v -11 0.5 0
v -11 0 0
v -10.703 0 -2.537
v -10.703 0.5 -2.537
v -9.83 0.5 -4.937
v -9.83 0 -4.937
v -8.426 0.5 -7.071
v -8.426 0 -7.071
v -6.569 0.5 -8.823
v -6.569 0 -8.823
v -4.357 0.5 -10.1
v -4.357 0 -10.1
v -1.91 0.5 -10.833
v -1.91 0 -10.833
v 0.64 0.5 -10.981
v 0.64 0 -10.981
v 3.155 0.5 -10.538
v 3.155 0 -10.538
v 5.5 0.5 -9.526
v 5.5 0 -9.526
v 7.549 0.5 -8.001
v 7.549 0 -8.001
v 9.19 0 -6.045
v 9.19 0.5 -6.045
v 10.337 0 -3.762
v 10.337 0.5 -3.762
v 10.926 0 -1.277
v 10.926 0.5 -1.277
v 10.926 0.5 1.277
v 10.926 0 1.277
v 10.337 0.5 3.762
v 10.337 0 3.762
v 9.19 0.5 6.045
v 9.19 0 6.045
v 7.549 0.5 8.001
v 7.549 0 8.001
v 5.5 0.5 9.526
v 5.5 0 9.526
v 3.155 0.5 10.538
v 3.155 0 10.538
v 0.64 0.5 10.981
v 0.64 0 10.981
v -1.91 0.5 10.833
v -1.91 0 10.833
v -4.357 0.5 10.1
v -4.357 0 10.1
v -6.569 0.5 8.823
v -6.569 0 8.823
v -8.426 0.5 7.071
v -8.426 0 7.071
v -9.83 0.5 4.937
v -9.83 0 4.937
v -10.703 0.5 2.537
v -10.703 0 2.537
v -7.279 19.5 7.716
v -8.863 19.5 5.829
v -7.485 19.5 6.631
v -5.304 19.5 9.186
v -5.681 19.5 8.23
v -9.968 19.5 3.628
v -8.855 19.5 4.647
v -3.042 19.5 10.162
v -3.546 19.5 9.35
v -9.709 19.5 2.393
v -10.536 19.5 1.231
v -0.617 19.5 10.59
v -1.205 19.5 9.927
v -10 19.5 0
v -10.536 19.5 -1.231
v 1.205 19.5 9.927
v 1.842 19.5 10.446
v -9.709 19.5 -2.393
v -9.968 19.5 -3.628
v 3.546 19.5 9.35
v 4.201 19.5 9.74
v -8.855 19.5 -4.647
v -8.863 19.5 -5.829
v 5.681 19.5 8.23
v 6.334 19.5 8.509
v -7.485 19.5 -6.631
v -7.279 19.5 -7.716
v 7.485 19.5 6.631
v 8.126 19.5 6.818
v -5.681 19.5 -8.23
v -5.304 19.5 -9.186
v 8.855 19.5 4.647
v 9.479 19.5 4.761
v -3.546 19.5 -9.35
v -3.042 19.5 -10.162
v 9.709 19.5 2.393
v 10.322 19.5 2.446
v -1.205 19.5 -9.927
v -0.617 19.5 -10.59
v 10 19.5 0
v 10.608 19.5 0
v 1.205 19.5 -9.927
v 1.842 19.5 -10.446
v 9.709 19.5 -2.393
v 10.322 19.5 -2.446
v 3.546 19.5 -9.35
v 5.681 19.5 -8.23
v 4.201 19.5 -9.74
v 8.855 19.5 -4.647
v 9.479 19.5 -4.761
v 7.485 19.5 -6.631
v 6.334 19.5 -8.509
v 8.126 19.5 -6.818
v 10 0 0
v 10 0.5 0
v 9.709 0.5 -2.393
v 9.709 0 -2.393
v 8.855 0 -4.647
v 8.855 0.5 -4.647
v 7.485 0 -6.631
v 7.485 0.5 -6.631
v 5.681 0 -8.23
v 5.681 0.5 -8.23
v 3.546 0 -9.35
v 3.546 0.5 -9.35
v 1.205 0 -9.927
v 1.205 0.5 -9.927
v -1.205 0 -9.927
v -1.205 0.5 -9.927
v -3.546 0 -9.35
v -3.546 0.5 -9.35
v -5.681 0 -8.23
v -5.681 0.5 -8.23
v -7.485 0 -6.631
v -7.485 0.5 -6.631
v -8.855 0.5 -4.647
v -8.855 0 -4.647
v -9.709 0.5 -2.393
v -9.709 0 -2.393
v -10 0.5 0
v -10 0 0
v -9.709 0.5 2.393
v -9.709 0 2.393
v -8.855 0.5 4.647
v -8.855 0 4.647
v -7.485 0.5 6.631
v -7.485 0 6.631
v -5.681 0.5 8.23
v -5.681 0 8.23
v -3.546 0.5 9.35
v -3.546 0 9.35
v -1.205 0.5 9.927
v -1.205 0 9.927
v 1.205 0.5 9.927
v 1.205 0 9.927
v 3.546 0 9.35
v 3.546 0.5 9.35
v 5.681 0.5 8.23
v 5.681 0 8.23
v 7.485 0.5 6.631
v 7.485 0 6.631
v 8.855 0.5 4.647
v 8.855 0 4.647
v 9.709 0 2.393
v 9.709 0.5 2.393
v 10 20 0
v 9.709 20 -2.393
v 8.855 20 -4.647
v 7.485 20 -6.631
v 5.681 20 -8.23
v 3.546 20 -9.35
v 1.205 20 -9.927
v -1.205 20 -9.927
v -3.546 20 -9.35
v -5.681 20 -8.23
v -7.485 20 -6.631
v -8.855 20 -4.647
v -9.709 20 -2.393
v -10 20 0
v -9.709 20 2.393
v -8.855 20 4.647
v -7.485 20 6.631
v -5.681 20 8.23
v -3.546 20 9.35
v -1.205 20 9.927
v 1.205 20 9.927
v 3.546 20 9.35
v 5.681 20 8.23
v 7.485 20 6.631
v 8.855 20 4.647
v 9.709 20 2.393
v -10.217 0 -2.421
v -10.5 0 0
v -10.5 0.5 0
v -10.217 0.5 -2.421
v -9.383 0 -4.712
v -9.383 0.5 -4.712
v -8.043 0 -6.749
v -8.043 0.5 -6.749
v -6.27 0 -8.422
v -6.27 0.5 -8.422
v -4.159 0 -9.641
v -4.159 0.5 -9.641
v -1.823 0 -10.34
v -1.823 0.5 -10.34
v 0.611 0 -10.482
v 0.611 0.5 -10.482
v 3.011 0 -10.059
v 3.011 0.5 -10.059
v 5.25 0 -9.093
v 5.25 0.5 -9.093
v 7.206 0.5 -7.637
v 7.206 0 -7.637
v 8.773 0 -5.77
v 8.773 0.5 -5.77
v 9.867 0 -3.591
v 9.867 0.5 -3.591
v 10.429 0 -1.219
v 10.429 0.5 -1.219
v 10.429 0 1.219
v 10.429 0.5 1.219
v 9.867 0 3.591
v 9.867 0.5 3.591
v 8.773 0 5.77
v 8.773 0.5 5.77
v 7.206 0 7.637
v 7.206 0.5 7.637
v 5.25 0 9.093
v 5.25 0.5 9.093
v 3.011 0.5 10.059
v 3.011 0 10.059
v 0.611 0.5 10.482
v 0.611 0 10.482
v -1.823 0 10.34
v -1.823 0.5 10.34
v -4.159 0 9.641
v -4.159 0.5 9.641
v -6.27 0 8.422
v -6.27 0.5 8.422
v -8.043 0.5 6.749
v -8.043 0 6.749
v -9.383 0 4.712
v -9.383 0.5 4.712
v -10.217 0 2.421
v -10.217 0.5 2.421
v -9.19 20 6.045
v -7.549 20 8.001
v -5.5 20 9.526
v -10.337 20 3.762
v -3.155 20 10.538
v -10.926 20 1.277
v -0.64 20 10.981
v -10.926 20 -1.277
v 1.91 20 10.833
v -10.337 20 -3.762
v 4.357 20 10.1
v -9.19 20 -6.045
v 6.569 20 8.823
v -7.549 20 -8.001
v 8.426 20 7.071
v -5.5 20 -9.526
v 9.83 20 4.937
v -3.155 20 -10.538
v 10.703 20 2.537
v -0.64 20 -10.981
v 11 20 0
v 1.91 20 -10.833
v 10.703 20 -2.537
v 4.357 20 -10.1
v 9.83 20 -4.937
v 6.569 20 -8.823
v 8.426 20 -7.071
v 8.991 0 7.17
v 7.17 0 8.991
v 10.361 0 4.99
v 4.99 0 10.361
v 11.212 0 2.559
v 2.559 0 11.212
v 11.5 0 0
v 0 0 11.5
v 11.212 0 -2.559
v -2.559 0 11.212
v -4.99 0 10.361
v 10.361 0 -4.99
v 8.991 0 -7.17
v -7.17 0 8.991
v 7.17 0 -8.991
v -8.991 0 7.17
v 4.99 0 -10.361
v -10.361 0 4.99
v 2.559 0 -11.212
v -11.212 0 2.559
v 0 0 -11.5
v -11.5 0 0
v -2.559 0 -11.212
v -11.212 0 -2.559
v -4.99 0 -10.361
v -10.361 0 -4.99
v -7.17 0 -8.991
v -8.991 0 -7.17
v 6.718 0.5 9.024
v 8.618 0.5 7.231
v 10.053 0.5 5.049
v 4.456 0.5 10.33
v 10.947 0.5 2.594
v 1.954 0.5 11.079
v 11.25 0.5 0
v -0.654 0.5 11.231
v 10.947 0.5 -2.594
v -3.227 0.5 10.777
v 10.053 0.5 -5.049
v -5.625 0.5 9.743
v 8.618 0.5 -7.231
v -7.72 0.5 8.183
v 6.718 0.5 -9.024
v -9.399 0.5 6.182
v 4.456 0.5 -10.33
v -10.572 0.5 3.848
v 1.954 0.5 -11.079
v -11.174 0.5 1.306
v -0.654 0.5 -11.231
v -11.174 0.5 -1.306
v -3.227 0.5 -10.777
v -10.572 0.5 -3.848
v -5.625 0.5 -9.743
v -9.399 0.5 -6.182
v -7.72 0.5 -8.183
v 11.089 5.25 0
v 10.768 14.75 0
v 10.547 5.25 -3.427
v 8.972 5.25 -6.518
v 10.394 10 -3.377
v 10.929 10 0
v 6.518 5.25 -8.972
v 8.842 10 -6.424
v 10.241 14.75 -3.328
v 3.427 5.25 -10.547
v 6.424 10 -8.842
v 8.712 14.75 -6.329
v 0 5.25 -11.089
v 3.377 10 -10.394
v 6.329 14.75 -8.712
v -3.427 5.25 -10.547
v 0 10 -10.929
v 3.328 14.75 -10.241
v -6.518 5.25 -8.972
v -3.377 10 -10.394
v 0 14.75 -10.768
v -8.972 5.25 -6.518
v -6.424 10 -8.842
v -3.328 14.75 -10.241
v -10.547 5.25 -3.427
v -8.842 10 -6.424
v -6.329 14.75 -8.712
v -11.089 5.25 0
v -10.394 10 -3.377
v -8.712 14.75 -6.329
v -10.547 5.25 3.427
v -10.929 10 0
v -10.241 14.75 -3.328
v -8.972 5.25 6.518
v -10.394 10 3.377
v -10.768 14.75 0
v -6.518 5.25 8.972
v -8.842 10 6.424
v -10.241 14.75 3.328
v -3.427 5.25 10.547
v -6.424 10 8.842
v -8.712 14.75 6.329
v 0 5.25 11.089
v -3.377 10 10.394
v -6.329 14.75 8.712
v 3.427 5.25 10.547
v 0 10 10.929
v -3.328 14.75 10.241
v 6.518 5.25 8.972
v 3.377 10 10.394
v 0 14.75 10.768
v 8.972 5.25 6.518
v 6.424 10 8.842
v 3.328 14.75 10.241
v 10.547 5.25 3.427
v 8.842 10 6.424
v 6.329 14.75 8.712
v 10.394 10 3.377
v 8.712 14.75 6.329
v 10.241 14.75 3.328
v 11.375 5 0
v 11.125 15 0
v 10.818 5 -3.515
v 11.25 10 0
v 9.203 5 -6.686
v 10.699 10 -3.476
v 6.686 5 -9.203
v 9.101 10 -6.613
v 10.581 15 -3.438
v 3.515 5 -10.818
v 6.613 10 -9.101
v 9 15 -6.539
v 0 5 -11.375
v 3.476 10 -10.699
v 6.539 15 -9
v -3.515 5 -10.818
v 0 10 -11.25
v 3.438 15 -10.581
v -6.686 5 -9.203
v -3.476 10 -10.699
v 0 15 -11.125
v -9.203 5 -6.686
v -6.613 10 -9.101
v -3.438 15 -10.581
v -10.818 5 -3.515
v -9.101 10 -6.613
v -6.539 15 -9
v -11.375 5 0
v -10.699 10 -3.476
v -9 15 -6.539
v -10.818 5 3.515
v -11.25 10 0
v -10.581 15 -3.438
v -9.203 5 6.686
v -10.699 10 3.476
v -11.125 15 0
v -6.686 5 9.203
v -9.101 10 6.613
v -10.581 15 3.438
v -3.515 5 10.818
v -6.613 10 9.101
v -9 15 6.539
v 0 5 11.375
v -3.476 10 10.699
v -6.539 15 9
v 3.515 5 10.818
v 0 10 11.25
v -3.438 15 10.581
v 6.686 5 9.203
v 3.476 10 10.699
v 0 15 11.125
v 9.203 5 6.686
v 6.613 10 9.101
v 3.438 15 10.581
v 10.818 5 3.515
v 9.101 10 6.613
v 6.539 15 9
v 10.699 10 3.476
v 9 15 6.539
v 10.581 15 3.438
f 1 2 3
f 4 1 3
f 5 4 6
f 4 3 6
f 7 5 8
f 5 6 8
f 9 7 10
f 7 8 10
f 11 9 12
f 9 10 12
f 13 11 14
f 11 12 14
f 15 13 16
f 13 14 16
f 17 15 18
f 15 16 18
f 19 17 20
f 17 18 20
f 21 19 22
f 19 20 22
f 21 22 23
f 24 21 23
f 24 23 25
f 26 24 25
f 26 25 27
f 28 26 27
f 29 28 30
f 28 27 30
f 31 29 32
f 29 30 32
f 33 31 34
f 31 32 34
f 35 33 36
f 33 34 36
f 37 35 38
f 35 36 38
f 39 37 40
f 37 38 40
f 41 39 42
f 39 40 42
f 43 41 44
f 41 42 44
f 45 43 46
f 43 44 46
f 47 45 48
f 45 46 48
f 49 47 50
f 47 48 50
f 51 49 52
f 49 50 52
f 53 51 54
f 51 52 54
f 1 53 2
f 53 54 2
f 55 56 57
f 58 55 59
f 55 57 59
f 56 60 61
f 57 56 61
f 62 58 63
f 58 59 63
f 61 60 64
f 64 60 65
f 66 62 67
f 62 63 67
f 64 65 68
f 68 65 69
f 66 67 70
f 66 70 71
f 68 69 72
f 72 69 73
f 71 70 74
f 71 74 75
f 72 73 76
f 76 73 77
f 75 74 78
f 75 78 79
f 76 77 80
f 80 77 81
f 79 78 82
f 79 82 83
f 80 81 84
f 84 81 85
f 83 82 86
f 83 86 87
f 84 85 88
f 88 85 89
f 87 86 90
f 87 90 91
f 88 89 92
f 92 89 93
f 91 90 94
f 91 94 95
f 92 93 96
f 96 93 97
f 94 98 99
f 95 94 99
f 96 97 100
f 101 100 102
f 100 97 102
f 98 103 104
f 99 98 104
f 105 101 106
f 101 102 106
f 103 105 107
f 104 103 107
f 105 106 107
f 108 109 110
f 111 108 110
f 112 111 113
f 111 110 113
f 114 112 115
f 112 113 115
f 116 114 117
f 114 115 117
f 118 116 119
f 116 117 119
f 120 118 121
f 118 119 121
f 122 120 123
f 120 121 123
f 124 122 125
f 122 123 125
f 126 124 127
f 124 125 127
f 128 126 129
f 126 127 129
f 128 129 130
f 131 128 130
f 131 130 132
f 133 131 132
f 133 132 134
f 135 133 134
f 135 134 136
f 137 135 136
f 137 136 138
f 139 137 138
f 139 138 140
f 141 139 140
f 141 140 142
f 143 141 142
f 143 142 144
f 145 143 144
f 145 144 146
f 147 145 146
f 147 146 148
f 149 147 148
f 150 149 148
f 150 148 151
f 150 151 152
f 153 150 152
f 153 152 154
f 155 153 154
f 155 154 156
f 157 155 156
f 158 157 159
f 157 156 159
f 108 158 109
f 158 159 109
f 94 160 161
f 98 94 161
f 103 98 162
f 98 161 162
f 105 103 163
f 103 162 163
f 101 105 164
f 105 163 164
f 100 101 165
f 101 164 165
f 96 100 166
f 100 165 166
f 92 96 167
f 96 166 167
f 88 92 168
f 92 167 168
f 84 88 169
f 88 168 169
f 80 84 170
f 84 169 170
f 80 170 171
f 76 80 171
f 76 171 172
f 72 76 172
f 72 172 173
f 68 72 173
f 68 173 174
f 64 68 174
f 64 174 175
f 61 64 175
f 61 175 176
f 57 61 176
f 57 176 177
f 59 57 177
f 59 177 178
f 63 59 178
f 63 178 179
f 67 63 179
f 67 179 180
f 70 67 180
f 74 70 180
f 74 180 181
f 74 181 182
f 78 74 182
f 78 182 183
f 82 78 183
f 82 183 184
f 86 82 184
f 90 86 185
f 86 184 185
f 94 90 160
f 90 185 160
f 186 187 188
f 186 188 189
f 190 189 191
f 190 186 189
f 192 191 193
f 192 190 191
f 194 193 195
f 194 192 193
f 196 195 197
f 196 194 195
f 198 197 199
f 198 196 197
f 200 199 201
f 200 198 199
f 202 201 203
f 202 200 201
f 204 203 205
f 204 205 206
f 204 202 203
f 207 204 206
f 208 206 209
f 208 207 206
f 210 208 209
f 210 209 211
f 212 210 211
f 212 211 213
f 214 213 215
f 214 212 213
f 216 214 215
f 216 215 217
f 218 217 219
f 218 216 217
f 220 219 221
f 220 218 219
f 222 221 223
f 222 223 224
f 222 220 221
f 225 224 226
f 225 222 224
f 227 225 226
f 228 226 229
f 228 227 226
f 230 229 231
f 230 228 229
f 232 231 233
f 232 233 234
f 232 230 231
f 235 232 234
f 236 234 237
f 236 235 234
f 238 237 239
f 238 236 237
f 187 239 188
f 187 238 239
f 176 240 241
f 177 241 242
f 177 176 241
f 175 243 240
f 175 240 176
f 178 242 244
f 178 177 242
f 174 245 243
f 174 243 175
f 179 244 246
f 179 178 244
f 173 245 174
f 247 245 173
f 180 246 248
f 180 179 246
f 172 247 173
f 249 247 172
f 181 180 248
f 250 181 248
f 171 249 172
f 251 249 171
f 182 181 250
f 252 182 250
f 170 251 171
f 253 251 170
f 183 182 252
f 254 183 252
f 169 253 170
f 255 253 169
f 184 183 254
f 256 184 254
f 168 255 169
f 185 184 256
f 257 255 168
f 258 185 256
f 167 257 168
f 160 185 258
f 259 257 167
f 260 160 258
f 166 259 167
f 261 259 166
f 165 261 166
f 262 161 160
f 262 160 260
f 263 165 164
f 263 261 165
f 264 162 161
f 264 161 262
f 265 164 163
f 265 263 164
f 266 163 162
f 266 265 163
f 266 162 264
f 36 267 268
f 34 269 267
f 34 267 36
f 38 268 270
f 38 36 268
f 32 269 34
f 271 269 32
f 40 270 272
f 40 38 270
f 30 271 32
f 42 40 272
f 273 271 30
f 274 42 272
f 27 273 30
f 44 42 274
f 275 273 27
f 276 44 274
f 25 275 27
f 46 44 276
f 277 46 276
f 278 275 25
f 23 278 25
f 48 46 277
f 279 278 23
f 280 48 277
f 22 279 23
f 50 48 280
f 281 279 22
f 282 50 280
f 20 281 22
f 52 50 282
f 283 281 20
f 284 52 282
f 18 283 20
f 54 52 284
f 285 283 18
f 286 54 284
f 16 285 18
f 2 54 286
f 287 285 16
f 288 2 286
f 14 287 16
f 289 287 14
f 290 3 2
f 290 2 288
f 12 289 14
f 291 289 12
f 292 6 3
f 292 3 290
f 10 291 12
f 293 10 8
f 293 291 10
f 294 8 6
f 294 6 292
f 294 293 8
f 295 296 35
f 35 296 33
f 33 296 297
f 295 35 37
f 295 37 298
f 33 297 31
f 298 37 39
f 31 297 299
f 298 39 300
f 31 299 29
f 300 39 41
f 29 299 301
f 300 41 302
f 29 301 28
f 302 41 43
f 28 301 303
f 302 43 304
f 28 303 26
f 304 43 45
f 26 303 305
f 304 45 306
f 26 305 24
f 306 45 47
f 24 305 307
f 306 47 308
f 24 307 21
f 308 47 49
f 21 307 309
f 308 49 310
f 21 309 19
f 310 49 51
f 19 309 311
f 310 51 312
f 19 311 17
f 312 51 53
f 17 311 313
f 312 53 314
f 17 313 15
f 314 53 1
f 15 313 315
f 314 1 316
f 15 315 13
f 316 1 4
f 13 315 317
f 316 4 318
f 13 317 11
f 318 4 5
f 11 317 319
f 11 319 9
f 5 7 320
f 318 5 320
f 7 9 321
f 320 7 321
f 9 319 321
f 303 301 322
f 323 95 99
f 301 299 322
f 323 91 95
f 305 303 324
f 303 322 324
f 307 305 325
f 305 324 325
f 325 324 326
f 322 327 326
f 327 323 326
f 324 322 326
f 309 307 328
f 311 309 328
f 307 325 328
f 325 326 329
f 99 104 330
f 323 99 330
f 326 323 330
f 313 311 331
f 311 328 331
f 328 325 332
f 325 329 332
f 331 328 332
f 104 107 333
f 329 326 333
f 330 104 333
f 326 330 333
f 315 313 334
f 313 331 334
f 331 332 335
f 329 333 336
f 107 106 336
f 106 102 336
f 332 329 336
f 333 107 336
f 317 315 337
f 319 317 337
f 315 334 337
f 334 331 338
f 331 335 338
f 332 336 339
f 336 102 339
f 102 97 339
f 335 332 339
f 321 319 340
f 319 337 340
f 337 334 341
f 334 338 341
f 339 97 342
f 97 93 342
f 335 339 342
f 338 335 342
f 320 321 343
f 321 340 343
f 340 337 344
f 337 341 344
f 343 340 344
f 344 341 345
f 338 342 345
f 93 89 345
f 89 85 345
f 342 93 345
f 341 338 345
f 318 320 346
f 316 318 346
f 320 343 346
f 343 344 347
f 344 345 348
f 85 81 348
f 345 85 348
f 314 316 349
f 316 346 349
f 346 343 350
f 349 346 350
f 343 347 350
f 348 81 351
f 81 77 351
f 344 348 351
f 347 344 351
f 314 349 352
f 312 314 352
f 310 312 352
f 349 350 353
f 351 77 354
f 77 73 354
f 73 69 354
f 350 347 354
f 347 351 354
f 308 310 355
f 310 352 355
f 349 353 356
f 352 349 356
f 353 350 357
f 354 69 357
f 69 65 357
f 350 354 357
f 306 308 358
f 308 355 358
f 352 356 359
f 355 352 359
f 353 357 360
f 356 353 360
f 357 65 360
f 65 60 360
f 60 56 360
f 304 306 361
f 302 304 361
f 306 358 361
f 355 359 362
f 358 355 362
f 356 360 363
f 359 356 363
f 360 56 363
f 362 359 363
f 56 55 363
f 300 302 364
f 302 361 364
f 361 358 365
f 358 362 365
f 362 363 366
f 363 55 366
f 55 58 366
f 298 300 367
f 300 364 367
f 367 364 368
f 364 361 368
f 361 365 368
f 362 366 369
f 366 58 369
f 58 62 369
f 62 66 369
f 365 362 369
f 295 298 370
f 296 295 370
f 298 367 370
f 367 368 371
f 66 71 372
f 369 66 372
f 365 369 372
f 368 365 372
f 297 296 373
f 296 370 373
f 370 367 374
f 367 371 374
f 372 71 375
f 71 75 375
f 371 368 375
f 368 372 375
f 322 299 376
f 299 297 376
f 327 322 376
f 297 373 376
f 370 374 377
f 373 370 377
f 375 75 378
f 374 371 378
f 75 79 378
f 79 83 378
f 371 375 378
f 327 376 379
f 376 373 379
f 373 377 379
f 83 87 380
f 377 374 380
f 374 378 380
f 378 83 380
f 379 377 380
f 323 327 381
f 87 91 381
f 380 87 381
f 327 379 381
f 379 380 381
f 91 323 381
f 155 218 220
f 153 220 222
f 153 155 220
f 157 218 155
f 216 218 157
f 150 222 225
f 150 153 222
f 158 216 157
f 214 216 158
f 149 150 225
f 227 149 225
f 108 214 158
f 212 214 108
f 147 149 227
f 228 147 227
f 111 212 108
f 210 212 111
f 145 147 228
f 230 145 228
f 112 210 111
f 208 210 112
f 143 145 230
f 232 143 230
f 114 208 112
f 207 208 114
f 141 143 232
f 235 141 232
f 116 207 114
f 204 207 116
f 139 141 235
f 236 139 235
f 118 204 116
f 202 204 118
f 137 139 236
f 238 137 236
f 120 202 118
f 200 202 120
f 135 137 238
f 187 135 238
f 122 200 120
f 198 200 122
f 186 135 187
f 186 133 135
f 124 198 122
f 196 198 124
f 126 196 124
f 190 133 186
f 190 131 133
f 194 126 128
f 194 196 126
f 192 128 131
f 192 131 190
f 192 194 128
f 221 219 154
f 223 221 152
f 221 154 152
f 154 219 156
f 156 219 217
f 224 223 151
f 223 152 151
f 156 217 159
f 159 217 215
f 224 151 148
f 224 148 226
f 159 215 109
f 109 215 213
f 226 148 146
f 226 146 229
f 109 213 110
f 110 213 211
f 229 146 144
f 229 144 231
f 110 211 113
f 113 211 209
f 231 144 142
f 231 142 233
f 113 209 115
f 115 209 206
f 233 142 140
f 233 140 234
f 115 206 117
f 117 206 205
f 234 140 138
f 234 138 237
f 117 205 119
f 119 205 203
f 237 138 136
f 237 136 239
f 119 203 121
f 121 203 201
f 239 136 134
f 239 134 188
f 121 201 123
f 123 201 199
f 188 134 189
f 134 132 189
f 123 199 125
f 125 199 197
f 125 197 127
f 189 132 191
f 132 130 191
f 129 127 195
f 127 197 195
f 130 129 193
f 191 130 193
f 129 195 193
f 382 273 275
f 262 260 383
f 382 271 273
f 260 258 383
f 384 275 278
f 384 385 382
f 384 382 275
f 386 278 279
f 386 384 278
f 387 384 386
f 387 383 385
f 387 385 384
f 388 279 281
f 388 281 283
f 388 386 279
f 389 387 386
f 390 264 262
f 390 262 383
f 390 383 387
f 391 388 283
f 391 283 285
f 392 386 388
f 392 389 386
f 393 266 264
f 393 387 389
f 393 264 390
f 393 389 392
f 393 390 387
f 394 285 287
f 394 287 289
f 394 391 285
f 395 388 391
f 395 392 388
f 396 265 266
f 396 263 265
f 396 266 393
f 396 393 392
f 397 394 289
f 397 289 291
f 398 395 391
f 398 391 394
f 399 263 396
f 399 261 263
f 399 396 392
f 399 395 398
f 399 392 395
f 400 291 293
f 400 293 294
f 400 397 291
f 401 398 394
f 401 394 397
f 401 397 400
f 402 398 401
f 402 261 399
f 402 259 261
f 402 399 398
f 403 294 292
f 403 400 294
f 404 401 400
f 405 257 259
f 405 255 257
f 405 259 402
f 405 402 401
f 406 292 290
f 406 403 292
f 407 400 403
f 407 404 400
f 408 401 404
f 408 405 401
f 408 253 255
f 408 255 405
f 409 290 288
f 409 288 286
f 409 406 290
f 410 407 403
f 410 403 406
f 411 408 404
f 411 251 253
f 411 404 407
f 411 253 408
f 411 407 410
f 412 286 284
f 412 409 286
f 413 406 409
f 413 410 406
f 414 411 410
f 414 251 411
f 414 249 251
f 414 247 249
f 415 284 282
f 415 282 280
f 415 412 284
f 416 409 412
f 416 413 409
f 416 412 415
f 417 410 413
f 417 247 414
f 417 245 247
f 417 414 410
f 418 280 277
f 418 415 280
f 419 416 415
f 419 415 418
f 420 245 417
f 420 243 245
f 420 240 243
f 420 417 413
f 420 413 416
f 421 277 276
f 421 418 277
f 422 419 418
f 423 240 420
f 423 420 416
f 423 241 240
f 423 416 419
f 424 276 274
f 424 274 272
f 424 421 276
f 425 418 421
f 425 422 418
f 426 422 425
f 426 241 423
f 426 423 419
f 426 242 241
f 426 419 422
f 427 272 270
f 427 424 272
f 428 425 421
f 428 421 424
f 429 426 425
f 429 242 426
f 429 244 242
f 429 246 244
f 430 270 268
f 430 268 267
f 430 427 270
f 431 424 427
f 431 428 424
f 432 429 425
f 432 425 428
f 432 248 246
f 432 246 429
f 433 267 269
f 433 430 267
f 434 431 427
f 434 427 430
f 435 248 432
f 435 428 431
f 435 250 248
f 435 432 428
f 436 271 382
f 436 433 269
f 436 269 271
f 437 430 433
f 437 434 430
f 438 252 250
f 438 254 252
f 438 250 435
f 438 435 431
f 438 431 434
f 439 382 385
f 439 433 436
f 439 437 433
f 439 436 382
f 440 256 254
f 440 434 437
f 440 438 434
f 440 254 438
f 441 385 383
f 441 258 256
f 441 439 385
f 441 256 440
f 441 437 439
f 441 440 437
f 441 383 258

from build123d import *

# Parameters (mm, degrees)
SKETCH6_R          = 10
CUT_EXTRUDE1_DEPTH = 20
SKETCH8_R          = 11
SKETCH8_R_2        = 10.5
CUT_EXTRUDE3_DEPTH = 0.5


with BuildPart() as part:
    # Sketch3 → Revolve1 (revolve)
    with BuildSketch(Plane.XY):
        Polygon((0, 0), (11.5, 0), (11, 20), (0, 20), align=None)
    revolve(axis=Axis((0, 0, 0), (0, 1, 0)))

    # Sketch6 → Cut-Extrude1 (cut)
    with BuildSketch(Plane(origin=(0, 20, 0), x_dir=(1, 0, 0), z_dir=(0, 1, 0))):
        Circle(SKETCH6_R)
    extrude(amount=-CUT_EXTRUDE1_DEPTH, mode=Mode.SUBTRACT)

    # Sketch7 → Cut-Revolve1 (revolve, cut)
    with BuildSketch(Plane.XY):
        Polygon((10, 19.5), (10, 0.5), (11.250026684, 0.5), (10.607608939, 19.5), align=None)
    revolve(axis=Axis((0, 0, 0), (0, 1, 0)), mode=Mode.SUBTRACT)

    # Sketch8 → Cut-Extrude3 (cut)
    with BuildSketch(Plane(origin=(0, 0, 0), x_dir=(-1, 0, 0), z_dir=(0, -1, 0))):
        Circle(SKETCH8_R)
        Circle(SKETCH8_R_2, mode=Mode.SUBTRACT)
    extrude(amount=-CUT_EXTRUDE3_DEPTH, mode=Mode.SUBTRACT)


solid = part.part
